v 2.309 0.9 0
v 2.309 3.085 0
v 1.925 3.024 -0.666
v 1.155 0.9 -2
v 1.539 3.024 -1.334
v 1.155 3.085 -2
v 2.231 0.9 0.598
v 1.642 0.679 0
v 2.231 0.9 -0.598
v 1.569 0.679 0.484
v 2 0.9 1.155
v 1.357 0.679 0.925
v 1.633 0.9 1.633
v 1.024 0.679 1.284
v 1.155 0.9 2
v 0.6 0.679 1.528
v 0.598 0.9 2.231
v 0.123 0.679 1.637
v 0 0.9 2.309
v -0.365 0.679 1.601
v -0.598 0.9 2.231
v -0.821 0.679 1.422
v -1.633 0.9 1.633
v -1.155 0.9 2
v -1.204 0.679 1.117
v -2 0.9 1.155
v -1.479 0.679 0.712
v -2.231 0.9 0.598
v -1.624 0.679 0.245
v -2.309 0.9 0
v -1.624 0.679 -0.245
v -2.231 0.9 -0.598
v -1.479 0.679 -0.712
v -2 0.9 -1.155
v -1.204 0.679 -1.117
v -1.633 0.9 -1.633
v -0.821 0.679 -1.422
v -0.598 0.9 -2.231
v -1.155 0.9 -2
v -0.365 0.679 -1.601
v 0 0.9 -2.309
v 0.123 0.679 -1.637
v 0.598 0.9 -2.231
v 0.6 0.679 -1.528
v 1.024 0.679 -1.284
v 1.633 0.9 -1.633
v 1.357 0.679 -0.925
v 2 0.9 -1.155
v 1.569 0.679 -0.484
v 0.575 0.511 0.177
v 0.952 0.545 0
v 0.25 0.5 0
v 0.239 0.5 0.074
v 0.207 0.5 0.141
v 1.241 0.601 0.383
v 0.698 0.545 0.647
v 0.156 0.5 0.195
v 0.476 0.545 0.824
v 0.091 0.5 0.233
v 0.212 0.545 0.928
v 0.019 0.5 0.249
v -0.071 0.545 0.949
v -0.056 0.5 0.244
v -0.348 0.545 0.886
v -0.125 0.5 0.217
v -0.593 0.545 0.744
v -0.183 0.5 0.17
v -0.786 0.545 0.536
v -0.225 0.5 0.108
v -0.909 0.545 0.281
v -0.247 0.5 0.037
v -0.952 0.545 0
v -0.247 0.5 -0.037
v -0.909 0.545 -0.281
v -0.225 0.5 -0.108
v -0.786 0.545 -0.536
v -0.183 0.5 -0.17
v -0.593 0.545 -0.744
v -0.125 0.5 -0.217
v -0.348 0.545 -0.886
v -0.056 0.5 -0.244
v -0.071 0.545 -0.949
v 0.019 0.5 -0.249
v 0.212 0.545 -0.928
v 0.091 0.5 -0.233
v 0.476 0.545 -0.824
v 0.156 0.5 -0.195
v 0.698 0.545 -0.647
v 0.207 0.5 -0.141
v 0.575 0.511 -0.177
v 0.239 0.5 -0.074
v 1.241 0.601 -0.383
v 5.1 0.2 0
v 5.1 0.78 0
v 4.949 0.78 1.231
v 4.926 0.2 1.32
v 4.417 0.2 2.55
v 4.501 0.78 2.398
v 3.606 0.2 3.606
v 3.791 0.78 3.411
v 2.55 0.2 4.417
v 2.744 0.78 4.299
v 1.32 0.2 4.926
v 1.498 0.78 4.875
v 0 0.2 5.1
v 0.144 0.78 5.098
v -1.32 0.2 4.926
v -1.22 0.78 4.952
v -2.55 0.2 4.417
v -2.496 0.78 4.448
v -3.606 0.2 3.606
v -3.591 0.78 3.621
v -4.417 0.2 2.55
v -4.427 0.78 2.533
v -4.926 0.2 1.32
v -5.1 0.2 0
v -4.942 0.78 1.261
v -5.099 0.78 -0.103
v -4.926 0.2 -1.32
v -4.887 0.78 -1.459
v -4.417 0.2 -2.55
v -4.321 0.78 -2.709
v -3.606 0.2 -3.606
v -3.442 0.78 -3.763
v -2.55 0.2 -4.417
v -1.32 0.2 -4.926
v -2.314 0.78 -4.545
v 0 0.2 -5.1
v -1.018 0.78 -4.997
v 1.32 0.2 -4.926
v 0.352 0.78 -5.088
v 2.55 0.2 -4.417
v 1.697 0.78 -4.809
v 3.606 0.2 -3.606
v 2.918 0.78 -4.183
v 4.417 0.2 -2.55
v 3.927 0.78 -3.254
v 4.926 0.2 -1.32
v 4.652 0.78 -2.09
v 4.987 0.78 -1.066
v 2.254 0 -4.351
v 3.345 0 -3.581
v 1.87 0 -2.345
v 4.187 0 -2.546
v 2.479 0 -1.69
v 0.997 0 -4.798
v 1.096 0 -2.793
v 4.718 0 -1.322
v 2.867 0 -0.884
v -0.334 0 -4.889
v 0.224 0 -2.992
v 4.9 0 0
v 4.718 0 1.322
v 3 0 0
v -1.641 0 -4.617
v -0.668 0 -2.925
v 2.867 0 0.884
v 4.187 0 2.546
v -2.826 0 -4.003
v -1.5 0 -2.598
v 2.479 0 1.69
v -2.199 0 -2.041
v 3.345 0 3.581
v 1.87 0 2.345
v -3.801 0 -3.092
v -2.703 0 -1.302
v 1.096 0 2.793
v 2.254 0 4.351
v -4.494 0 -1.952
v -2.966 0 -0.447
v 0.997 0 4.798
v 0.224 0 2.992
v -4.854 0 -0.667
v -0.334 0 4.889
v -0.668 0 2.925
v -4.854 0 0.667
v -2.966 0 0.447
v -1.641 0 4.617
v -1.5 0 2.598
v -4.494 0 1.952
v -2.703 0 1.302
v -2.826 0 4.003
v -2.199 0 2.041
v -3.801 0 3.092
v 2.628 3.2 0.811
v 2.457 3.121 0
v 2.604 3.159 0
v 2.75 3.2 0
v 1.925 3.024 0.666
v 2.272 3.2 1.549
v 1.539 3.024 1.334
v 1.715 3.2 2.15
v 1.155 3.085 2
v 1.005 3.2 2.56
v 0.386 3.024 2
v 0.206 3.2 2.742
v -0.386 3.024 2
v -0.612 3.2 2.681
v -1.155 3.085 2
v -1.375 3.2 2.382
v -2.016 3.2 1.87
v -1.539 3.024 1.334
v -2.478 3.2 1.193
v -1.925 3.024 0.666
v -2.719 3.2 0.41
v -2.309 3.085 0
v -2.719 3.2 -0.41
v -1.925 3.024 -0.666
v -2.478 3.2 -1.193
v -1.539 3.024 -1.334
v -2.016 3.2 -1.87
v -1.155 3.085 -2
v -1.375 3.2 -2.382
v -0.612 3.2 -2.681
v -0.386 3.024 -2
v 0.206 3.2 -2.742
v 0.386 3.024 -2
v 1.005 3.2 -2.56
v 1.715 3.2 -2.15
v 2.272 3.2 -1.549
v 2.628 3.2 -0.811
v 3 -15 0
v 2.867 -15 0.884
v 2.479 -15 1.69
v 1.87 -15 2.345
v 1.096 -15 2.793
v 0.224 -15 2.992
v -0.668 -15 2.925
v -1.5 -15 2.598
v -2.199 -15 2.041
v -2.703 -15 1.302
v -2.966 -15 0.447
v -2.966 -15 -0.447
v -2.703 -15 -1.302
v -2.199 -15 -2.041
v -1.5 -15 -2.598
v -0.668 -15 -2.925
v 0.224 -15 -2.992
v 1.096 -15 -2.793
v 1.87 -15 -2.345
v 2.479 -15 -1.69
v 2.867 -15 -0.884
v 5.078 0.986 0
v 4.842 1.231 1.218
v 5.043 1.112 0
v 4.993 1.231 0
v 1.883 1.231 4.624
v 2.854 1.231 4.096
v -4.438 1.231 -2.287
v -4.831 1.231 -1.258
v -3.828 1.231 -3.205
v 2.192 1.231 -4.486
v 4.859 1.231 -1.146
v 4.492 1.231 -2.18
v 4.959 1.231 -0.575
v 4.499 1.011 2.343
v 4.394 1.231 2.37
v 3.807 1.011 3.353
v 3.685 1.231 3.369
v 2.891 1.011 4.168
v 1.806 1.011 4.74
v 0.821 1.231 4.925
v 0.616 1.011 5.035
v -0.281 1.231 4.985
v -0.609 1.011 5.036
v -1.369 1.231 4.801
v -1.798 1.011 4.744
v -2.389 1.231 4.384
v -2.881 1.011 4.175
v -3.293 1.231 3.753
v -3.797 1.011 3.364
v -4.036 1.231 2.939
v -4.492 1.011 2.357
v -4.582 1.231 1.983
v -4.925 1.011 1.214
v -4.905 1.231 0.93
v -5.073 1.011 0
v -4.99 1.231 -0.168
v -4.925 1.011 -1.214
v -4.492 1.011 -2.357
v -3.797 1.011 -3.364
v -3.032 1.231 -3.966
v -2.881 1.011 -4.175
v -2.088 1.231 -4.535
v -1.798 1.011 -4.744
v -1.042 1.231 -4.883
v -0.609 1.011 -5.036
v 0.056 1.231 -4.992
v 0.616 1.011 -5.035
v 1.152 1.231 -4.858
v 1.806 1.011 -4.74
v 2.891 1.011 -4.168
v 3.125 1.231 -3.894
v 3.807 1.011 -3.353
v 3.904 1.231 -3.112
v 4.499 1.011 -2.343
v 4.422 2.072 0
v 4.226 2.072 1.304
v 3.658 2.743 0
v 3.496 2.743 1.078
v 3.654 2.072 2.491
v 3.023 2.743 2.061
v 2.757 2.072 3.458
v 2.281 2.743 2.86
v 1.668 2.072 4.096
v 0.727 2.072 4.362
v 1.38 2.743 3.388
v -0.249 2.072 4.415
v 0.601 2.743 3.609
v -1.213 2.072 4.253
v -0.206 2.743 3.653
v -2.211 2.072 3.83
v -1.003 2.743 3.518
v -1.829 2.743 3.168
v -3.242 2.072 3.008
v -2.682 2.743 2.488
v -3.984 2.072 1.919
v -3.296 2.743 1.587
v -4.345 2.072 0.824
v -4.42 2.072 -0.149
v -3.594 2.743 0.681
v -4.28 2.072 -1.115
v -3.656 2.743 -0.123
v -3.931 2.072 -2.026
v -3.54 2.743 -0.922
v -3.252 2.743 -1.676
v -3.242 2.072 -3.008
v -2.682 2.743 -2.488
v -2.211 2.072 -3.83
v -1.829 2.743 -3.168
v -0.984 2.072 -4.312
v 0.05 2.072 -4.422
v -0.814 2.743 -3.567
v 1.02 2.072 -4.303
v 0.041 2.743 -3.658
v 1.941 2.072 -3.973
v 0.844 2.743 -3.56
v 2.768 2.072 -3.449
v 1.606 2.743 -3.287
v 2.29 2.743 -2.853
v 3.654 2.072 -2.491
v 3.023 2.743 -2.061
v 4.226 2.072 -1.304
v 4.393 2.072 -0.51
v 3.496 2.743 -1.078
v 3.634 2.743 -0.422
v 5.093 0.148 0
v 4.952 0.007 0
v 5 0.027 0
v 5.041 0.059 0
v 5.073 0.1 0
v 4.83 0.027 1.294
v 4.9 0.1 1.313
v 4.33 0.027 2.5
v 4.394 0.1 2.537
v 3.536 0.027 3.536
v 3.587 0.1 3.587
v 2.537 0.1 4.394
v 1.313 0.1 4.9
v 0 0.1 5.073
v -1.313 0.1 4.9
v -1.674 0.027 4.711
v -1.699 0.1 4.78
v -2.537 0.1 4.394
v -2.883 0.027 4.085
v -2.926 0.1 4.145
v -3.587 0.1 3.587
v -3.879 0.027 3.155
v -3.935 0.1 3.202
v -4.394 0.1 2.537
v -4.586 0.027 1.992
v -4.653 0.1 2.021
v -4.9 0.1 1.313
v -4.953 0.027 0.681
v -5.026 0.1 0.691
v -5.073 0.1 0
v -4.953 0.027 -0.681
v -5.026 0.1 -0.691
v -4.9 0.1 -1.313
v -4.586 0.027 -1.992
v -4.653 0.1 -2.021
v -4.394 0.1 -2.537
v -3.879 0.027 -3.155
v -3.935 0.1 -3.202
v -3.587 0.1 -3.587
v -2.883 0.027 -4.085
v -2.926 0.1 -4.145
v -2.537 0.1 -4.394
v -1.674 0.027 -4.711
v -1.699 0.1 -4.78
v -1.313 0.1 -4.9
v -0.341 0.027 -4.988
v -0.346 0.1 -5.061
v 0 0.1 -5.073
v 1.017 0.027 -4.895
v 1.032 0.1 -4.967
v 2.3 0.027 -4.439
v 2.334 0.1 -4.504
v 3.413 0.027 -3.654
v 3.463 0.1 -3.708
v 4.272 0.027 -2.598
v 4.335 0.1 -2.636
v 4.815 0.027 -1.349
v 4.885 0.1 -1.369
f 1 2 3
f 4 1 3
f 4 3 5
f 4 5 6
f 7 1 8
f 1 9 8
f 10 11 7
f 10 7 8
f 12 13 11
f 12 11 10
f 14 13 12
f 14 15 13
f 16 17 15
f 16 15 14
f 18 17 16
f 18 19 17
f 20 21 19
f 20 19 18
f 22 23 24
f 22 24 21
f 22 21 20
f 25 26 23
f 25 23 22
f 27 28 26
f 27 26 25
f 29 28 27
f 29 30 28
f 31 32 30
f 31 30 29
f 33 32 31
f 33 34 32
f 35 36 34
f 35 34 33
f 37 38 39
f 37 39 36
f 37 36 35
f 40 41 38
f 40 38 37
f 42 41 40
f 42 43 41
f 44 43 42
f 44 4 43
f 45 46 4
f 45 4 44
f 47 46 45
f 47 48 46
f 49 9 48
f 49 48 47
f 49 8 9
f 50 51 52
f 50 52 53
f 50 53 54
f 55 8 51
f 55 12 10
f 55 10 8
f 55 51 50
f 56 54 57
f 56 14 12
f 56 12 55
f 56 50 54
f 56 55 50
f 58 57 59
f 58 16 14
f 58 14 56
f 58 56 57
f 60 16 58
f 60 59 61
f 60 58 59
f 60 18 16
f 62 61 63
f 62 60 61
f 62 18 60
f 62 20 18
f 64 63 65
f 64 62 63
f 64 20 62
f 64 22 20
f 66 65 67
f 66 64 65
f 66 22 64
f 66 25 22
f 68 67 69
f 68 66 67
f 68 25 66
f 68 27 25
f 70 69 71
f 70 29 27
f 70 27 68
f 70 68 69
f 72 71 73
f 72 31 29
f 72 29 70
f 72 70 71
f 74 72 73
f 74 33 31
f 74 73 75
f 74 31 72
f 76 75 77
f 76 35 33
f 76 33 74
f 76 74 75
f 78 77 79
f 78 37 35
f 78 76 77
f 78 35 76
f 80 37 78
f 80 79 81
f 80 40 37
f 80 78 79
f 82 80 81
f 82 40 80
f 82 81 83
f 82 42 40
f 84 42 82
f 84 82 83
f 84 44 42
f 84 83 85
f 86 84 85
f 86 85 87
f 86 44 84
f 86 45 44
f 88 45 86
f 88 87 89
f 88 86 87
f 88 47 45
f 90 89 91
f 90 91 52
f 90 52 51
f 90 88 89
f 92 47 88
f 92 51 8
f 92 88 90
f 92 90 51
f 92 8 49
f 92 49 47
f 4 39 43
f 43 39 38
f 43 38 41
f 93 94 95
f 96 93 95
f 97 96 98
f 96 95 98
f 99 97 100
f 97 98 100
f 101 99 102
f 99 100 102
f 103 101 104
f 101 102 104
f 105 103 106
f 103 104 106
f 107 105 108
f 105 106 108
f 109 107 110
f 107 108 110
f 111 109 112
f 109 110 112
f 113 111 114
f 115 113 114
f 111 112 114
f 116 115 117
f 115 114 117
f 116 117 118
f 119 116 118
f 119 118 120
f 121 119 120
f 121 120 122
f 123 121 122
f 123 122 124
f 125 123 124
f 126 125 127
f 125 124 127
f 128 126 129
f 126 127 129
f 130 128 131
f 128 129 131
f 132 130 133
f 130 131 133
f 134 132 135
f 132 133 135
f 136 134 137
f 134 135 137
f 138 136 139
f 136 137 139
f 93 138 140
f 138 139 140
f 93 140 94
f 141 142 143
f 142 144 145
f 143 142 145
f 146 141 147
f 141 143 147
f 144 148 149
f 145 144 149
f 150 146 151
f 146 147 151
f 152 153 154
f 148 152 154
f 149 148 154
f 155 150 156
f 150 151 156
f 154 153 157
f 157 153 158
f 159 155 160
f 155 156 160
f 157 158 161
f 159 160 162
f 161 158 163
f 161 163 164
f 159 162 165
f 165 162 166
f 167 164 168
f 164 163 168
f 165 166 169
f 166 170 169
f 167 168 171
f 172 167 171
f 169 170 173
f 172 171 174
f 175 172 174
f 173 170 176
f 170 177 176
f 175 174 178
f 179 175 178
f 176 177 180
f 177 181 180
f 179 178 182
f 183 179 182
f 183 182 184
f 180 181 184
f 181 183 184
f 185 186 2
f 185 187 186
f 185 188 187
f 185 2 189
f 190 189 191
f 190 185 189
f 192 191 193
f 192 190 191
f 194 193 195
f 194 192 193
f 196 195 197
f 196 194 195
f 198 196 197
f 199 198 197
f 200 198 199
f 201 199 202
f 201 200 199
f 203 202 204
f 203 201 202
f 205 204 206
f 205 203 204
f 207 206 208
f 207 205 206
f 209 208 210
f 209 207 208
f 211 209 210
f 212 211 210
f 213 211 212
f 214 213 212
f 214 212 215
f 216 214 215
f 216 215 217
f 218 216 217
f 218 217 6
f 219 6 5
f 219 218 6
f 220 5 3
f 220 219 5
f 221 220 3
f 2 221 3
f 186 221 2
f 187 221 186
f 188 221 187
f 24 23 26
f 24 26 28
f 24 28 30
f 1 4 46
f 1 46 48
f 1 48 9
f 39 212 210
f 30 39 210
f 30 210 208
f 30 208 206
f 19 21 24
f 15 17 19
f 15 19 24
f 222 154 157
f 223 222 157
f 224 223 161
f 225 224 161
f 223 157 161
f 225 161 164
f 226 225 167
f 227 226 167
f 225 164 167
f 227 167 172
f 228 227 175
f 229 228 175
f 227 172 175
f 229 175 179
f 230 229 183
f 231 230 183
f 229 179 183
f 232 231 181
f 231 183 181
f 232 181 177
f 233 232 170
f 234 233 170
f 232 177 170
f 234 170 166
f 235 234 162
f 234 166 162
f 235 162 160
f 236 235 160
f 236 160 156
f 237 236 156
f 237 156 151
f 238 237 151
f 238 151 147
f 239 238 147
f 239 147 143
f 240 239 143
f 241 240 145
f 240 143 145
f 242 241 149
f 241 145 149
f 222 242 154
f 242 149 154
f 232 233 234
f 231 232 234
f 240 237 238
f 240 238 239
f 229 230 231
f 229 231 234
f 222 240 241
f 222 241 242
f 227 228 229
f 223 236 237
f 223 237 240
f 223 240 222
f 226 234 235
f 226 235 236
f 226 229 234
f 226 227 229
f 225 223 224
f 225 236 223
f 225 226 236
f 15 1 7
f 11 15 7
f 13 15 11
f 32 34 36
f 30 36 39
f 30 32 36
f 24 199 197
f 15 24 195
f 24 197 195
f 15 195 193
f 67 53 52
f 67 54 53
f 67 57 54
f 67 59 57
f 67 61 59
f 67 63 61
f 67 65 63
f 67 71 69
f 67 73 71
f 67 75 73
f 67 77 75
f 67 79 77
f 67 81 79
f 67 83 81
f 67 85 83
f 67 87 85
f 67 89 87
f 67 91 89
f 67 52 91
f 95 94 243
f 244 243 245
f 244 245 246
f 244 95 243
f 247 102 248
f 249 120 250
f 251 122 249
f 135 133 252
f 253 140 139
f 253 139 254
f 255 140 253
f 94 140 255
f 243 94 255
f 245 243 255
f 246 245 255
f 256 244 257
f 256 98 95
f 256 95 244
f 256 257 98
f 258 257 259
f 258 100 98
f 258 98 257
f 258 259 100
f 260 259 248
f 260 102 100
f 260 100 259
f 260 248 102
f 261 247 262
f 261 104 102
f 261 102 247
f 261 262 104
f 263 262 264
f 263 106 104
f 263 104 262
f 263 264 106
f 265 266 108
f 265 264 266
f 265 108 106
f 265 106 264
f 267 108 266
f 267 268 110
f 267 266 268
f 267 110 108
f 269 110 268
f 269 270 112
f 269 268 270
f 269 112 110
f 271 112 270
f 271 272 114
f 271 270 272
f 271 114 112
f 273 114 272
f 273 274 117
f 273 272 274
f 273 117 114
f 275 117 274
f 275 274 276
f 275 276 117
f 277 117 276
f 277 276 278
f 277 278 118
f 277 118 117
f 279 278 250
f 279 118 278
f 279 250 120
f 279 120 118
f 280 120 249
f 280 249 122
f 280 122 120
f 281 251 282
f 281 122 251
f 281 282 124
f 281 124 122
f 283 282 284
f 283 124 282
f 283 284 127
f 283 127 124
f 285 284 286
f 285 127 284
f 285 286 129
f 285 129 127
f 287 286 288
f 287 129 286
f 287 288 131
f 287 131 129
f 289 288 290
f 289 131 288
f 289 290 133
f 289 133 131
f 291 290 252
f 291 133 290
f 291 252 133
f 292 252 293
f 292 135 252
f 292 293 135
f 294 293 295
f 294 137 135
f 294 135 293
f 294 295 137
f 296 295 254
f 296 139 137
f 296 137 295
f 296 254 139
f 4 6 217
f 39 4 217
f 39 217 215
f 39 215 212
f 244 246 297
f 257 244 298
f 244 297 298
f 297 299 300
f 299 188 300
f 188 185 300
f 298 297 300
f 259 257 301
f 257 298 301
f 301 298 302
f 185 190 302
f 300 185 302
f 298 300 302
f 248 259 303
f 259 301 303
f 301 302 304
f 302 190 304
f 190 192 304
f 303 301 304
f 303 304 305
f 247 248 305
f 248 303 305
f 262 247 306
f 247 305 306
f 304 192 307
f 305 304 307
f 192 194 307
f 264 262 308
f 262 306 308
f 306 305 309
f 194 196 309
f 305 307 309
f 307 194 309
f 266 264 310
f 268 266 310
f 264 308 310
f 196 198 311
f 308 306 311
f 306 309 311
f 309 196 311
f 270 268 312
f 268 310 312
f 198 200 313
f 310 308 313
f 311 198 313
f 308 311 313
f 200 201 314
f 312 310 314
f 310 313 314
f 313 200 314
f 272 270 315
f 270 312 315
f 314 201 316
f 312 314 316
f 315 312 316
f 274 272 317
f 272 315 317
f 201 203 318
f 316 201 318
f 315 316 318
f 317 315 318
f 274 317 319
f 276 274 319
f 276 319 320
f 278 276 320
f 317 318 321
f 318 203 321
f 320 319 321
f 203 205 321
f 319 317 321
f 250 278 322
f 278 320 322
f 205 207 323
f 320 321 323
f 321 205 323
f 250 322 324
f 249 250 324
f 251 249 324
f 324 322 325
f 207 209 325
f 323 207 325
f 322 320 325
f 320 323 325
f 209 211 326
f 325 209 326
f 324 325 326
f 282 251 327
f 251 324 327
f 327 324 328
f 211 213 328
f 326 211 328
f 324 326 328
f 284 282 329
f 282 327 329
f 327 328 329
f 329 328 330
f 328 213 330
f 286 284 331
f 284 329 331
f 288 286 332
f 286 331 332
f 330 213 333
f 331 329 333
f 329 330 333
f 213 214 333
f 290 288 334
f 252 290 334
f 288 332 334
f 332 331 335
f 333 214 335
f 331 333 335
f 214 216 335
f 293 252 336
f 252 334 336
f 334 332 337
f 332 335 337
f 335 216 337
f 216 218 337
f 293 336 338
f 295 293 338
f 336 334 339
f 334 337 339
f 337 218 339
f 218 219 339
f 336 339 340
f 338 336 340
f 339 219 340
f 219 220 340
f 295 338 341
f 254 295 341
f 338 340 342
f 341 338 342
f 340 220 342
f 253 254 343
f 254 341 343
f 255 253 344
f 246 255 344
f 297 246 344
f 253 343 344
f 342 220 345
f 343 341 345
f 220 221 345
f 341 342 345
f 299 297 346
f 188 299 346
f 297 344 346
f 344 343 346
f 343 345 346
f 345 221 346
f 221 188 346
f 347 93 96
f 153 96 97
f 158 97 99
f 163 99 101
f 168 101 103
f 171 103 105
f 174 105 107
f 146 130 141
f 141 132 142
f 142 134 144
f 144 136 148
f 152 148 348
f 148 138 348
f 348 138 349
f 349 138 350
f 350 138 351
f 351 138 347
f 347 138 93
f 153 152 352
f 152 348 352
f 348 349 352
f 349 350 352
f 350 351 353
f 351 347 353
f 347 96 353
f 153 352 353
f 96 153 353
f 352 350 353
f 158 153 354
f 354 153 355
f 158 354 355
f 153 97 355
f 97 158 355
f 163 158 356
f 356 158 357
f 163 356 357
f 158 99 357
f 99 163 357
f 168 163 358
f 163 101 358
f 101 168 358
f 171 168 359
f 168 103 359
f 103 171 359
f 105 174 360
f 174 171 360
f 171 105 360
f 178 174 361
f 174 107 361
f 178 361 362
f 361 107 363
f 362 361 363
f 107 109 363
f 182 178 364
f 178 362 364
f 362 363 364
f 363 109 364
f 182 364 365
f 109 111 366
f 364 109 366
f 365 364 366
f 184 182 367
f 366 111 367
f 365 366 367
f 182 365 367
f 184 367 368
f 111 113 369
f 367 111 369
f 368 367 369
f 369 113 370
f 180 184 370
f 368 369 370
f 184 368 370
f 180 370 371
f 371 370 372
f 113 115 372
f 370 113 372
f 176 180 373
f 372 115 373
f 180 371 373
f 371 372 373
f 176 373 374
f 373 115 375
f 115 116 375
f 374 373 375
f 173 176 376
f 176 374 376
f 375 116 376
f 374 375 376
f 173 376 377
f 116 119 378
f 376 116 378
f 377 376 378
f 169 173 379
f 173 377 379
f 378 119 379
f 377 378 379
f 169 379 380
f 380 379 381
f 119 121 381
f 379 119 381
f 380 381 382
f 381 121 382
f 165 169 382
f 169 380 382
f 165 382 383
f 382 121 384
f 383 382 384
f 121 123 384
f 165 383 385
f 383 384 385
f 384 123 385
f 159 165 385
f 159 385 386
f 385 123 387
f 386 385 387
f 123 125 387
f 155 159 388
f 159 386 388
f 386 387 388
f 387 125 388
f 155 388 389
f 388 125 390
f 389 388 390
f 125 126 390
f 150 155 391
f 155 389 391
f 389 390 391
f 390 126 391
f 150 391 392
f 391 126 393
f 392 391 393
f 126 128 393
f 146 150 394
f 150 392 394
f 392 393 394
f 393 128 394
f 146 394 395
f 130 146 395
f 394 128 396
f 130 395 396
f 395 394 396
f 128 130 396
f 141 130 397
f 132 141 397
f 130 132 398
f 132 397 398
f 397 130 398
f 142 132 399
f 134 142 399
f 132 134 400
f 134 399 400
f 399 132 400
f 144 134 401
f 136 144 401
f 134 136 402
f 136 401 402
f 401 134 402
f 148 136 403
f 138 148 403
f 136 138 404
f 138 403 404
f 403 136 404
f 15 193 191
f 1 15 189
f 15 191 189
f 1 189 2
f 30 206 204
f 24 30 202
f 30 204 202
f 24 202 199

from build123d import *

# Parameters (mm, degrees)
FILLET1_R           = 0.2
FILLET2_R           = 1
SKETCH2_R           = 3
BOSS_EXTRUDE1_DEPTH = 15
CUT_EXTRUDE1_DEPTH  = 2.3


with BuildPart() as part:
    # Sketch1 → Revolve1 (revolve)
    with BuildSketch(Plane.XY):
        with BuildLine():
            Line((0, 0), (5.1, 0))
            Line((5.1, 0), (5.1, 1))
            ThreePointArc((5.1, 1), (4.1560785, 2.346833852), (2.75, 3.2))
            Line((2.75, 3.2), (0, 3.2))
            Line((0, 3.2), (0, 0))
        make_face()
    revolve(axis=Axis((0, 55, 0), (0, -1, 0)))

    # Fillet1
    fillet1_edges = [part.edges().sort_by_distance(p)[0] for p in [
        (-5.1, 0, 0),
    ]]
    fillet(fillet1_edges, radius=FILLET1_R)

    # Fillet2
    fillet2_edges = [part.edges().sort_by_distance(p)[0] for p in [
        (-5.1, 1, 0),
    ]]
    fillet(fillet2_edges, radius=FILLET2_R)

    # Sketch2 → Boss-Extrude1 (add)
    with BuildSketch(Plane.XZ):
        Circle(SKETCH2_R)
    extrude(amount=BOSS_EXTRUDE1_DEPTH)

    # Sketch6 → Revolve2 (revolve)
    with BuildSketch(Plane.XY):
        Polygon((0, 0), (0, 3.2), (2.75, 3.2), (4.9, 0), align=None)
    revolve(axis=Axis((0, 55, 0), (0, -1, 0)))

    # Sketch7 → Cut-Extrude1 (cut)
    with BuildSketch(Plane(origin=(0, 3.2, 0), x_dir=(1, 0, 0), z_dir=(0, 1, 0))):
        Polygon((1.154700538, -2), (2.309401077, 0), (1.154700538, 2), (-1.154700538, 2), (-2.309401077, 0), (-1.154700538, -2), align=None)
    extrude(amount=-CUT_EXTRUDE1_DEPTH, mode=Mode.SUBTRACT)

    # Sketch8 → Cut-Revolve1 (revolve, cut)
    with BuildSketch(Plane.XY):
        with BuildLine():
            Line((0, 0.9), (0, 0.5))
            Line((0, 0.5), (0.25, 0.5))
            ThreePointArc((0.25, 0.5), (1.298943849, 0.600925763), (2.309401077, 0.9))
            Line((2.309401077, 0.9), (0, 0.9))
        make_face()
    revolve(axis=Axis((0, 55, 0), (0, -1, 0)), mode=Mode.SUBTRACT)

    # Sketch9 → Cut-Revolve2 (revolve, cut)
    with BuildSketch(Plane.XY):
        with BuildLine():
            ThreePointArc((0, 2.814442262), (1.388448304, 2.911300775), (2.75, 3.2))
            Line((2.75, 3.2), (0, 3.2))
            Line((0, 3.2), (0, 2.814442262))
        make_face()
    revolve(axis=Axis((0, 55, 0), (0, -1, 0)), mode=Mode.SUBTRACT)


solid = part.part
